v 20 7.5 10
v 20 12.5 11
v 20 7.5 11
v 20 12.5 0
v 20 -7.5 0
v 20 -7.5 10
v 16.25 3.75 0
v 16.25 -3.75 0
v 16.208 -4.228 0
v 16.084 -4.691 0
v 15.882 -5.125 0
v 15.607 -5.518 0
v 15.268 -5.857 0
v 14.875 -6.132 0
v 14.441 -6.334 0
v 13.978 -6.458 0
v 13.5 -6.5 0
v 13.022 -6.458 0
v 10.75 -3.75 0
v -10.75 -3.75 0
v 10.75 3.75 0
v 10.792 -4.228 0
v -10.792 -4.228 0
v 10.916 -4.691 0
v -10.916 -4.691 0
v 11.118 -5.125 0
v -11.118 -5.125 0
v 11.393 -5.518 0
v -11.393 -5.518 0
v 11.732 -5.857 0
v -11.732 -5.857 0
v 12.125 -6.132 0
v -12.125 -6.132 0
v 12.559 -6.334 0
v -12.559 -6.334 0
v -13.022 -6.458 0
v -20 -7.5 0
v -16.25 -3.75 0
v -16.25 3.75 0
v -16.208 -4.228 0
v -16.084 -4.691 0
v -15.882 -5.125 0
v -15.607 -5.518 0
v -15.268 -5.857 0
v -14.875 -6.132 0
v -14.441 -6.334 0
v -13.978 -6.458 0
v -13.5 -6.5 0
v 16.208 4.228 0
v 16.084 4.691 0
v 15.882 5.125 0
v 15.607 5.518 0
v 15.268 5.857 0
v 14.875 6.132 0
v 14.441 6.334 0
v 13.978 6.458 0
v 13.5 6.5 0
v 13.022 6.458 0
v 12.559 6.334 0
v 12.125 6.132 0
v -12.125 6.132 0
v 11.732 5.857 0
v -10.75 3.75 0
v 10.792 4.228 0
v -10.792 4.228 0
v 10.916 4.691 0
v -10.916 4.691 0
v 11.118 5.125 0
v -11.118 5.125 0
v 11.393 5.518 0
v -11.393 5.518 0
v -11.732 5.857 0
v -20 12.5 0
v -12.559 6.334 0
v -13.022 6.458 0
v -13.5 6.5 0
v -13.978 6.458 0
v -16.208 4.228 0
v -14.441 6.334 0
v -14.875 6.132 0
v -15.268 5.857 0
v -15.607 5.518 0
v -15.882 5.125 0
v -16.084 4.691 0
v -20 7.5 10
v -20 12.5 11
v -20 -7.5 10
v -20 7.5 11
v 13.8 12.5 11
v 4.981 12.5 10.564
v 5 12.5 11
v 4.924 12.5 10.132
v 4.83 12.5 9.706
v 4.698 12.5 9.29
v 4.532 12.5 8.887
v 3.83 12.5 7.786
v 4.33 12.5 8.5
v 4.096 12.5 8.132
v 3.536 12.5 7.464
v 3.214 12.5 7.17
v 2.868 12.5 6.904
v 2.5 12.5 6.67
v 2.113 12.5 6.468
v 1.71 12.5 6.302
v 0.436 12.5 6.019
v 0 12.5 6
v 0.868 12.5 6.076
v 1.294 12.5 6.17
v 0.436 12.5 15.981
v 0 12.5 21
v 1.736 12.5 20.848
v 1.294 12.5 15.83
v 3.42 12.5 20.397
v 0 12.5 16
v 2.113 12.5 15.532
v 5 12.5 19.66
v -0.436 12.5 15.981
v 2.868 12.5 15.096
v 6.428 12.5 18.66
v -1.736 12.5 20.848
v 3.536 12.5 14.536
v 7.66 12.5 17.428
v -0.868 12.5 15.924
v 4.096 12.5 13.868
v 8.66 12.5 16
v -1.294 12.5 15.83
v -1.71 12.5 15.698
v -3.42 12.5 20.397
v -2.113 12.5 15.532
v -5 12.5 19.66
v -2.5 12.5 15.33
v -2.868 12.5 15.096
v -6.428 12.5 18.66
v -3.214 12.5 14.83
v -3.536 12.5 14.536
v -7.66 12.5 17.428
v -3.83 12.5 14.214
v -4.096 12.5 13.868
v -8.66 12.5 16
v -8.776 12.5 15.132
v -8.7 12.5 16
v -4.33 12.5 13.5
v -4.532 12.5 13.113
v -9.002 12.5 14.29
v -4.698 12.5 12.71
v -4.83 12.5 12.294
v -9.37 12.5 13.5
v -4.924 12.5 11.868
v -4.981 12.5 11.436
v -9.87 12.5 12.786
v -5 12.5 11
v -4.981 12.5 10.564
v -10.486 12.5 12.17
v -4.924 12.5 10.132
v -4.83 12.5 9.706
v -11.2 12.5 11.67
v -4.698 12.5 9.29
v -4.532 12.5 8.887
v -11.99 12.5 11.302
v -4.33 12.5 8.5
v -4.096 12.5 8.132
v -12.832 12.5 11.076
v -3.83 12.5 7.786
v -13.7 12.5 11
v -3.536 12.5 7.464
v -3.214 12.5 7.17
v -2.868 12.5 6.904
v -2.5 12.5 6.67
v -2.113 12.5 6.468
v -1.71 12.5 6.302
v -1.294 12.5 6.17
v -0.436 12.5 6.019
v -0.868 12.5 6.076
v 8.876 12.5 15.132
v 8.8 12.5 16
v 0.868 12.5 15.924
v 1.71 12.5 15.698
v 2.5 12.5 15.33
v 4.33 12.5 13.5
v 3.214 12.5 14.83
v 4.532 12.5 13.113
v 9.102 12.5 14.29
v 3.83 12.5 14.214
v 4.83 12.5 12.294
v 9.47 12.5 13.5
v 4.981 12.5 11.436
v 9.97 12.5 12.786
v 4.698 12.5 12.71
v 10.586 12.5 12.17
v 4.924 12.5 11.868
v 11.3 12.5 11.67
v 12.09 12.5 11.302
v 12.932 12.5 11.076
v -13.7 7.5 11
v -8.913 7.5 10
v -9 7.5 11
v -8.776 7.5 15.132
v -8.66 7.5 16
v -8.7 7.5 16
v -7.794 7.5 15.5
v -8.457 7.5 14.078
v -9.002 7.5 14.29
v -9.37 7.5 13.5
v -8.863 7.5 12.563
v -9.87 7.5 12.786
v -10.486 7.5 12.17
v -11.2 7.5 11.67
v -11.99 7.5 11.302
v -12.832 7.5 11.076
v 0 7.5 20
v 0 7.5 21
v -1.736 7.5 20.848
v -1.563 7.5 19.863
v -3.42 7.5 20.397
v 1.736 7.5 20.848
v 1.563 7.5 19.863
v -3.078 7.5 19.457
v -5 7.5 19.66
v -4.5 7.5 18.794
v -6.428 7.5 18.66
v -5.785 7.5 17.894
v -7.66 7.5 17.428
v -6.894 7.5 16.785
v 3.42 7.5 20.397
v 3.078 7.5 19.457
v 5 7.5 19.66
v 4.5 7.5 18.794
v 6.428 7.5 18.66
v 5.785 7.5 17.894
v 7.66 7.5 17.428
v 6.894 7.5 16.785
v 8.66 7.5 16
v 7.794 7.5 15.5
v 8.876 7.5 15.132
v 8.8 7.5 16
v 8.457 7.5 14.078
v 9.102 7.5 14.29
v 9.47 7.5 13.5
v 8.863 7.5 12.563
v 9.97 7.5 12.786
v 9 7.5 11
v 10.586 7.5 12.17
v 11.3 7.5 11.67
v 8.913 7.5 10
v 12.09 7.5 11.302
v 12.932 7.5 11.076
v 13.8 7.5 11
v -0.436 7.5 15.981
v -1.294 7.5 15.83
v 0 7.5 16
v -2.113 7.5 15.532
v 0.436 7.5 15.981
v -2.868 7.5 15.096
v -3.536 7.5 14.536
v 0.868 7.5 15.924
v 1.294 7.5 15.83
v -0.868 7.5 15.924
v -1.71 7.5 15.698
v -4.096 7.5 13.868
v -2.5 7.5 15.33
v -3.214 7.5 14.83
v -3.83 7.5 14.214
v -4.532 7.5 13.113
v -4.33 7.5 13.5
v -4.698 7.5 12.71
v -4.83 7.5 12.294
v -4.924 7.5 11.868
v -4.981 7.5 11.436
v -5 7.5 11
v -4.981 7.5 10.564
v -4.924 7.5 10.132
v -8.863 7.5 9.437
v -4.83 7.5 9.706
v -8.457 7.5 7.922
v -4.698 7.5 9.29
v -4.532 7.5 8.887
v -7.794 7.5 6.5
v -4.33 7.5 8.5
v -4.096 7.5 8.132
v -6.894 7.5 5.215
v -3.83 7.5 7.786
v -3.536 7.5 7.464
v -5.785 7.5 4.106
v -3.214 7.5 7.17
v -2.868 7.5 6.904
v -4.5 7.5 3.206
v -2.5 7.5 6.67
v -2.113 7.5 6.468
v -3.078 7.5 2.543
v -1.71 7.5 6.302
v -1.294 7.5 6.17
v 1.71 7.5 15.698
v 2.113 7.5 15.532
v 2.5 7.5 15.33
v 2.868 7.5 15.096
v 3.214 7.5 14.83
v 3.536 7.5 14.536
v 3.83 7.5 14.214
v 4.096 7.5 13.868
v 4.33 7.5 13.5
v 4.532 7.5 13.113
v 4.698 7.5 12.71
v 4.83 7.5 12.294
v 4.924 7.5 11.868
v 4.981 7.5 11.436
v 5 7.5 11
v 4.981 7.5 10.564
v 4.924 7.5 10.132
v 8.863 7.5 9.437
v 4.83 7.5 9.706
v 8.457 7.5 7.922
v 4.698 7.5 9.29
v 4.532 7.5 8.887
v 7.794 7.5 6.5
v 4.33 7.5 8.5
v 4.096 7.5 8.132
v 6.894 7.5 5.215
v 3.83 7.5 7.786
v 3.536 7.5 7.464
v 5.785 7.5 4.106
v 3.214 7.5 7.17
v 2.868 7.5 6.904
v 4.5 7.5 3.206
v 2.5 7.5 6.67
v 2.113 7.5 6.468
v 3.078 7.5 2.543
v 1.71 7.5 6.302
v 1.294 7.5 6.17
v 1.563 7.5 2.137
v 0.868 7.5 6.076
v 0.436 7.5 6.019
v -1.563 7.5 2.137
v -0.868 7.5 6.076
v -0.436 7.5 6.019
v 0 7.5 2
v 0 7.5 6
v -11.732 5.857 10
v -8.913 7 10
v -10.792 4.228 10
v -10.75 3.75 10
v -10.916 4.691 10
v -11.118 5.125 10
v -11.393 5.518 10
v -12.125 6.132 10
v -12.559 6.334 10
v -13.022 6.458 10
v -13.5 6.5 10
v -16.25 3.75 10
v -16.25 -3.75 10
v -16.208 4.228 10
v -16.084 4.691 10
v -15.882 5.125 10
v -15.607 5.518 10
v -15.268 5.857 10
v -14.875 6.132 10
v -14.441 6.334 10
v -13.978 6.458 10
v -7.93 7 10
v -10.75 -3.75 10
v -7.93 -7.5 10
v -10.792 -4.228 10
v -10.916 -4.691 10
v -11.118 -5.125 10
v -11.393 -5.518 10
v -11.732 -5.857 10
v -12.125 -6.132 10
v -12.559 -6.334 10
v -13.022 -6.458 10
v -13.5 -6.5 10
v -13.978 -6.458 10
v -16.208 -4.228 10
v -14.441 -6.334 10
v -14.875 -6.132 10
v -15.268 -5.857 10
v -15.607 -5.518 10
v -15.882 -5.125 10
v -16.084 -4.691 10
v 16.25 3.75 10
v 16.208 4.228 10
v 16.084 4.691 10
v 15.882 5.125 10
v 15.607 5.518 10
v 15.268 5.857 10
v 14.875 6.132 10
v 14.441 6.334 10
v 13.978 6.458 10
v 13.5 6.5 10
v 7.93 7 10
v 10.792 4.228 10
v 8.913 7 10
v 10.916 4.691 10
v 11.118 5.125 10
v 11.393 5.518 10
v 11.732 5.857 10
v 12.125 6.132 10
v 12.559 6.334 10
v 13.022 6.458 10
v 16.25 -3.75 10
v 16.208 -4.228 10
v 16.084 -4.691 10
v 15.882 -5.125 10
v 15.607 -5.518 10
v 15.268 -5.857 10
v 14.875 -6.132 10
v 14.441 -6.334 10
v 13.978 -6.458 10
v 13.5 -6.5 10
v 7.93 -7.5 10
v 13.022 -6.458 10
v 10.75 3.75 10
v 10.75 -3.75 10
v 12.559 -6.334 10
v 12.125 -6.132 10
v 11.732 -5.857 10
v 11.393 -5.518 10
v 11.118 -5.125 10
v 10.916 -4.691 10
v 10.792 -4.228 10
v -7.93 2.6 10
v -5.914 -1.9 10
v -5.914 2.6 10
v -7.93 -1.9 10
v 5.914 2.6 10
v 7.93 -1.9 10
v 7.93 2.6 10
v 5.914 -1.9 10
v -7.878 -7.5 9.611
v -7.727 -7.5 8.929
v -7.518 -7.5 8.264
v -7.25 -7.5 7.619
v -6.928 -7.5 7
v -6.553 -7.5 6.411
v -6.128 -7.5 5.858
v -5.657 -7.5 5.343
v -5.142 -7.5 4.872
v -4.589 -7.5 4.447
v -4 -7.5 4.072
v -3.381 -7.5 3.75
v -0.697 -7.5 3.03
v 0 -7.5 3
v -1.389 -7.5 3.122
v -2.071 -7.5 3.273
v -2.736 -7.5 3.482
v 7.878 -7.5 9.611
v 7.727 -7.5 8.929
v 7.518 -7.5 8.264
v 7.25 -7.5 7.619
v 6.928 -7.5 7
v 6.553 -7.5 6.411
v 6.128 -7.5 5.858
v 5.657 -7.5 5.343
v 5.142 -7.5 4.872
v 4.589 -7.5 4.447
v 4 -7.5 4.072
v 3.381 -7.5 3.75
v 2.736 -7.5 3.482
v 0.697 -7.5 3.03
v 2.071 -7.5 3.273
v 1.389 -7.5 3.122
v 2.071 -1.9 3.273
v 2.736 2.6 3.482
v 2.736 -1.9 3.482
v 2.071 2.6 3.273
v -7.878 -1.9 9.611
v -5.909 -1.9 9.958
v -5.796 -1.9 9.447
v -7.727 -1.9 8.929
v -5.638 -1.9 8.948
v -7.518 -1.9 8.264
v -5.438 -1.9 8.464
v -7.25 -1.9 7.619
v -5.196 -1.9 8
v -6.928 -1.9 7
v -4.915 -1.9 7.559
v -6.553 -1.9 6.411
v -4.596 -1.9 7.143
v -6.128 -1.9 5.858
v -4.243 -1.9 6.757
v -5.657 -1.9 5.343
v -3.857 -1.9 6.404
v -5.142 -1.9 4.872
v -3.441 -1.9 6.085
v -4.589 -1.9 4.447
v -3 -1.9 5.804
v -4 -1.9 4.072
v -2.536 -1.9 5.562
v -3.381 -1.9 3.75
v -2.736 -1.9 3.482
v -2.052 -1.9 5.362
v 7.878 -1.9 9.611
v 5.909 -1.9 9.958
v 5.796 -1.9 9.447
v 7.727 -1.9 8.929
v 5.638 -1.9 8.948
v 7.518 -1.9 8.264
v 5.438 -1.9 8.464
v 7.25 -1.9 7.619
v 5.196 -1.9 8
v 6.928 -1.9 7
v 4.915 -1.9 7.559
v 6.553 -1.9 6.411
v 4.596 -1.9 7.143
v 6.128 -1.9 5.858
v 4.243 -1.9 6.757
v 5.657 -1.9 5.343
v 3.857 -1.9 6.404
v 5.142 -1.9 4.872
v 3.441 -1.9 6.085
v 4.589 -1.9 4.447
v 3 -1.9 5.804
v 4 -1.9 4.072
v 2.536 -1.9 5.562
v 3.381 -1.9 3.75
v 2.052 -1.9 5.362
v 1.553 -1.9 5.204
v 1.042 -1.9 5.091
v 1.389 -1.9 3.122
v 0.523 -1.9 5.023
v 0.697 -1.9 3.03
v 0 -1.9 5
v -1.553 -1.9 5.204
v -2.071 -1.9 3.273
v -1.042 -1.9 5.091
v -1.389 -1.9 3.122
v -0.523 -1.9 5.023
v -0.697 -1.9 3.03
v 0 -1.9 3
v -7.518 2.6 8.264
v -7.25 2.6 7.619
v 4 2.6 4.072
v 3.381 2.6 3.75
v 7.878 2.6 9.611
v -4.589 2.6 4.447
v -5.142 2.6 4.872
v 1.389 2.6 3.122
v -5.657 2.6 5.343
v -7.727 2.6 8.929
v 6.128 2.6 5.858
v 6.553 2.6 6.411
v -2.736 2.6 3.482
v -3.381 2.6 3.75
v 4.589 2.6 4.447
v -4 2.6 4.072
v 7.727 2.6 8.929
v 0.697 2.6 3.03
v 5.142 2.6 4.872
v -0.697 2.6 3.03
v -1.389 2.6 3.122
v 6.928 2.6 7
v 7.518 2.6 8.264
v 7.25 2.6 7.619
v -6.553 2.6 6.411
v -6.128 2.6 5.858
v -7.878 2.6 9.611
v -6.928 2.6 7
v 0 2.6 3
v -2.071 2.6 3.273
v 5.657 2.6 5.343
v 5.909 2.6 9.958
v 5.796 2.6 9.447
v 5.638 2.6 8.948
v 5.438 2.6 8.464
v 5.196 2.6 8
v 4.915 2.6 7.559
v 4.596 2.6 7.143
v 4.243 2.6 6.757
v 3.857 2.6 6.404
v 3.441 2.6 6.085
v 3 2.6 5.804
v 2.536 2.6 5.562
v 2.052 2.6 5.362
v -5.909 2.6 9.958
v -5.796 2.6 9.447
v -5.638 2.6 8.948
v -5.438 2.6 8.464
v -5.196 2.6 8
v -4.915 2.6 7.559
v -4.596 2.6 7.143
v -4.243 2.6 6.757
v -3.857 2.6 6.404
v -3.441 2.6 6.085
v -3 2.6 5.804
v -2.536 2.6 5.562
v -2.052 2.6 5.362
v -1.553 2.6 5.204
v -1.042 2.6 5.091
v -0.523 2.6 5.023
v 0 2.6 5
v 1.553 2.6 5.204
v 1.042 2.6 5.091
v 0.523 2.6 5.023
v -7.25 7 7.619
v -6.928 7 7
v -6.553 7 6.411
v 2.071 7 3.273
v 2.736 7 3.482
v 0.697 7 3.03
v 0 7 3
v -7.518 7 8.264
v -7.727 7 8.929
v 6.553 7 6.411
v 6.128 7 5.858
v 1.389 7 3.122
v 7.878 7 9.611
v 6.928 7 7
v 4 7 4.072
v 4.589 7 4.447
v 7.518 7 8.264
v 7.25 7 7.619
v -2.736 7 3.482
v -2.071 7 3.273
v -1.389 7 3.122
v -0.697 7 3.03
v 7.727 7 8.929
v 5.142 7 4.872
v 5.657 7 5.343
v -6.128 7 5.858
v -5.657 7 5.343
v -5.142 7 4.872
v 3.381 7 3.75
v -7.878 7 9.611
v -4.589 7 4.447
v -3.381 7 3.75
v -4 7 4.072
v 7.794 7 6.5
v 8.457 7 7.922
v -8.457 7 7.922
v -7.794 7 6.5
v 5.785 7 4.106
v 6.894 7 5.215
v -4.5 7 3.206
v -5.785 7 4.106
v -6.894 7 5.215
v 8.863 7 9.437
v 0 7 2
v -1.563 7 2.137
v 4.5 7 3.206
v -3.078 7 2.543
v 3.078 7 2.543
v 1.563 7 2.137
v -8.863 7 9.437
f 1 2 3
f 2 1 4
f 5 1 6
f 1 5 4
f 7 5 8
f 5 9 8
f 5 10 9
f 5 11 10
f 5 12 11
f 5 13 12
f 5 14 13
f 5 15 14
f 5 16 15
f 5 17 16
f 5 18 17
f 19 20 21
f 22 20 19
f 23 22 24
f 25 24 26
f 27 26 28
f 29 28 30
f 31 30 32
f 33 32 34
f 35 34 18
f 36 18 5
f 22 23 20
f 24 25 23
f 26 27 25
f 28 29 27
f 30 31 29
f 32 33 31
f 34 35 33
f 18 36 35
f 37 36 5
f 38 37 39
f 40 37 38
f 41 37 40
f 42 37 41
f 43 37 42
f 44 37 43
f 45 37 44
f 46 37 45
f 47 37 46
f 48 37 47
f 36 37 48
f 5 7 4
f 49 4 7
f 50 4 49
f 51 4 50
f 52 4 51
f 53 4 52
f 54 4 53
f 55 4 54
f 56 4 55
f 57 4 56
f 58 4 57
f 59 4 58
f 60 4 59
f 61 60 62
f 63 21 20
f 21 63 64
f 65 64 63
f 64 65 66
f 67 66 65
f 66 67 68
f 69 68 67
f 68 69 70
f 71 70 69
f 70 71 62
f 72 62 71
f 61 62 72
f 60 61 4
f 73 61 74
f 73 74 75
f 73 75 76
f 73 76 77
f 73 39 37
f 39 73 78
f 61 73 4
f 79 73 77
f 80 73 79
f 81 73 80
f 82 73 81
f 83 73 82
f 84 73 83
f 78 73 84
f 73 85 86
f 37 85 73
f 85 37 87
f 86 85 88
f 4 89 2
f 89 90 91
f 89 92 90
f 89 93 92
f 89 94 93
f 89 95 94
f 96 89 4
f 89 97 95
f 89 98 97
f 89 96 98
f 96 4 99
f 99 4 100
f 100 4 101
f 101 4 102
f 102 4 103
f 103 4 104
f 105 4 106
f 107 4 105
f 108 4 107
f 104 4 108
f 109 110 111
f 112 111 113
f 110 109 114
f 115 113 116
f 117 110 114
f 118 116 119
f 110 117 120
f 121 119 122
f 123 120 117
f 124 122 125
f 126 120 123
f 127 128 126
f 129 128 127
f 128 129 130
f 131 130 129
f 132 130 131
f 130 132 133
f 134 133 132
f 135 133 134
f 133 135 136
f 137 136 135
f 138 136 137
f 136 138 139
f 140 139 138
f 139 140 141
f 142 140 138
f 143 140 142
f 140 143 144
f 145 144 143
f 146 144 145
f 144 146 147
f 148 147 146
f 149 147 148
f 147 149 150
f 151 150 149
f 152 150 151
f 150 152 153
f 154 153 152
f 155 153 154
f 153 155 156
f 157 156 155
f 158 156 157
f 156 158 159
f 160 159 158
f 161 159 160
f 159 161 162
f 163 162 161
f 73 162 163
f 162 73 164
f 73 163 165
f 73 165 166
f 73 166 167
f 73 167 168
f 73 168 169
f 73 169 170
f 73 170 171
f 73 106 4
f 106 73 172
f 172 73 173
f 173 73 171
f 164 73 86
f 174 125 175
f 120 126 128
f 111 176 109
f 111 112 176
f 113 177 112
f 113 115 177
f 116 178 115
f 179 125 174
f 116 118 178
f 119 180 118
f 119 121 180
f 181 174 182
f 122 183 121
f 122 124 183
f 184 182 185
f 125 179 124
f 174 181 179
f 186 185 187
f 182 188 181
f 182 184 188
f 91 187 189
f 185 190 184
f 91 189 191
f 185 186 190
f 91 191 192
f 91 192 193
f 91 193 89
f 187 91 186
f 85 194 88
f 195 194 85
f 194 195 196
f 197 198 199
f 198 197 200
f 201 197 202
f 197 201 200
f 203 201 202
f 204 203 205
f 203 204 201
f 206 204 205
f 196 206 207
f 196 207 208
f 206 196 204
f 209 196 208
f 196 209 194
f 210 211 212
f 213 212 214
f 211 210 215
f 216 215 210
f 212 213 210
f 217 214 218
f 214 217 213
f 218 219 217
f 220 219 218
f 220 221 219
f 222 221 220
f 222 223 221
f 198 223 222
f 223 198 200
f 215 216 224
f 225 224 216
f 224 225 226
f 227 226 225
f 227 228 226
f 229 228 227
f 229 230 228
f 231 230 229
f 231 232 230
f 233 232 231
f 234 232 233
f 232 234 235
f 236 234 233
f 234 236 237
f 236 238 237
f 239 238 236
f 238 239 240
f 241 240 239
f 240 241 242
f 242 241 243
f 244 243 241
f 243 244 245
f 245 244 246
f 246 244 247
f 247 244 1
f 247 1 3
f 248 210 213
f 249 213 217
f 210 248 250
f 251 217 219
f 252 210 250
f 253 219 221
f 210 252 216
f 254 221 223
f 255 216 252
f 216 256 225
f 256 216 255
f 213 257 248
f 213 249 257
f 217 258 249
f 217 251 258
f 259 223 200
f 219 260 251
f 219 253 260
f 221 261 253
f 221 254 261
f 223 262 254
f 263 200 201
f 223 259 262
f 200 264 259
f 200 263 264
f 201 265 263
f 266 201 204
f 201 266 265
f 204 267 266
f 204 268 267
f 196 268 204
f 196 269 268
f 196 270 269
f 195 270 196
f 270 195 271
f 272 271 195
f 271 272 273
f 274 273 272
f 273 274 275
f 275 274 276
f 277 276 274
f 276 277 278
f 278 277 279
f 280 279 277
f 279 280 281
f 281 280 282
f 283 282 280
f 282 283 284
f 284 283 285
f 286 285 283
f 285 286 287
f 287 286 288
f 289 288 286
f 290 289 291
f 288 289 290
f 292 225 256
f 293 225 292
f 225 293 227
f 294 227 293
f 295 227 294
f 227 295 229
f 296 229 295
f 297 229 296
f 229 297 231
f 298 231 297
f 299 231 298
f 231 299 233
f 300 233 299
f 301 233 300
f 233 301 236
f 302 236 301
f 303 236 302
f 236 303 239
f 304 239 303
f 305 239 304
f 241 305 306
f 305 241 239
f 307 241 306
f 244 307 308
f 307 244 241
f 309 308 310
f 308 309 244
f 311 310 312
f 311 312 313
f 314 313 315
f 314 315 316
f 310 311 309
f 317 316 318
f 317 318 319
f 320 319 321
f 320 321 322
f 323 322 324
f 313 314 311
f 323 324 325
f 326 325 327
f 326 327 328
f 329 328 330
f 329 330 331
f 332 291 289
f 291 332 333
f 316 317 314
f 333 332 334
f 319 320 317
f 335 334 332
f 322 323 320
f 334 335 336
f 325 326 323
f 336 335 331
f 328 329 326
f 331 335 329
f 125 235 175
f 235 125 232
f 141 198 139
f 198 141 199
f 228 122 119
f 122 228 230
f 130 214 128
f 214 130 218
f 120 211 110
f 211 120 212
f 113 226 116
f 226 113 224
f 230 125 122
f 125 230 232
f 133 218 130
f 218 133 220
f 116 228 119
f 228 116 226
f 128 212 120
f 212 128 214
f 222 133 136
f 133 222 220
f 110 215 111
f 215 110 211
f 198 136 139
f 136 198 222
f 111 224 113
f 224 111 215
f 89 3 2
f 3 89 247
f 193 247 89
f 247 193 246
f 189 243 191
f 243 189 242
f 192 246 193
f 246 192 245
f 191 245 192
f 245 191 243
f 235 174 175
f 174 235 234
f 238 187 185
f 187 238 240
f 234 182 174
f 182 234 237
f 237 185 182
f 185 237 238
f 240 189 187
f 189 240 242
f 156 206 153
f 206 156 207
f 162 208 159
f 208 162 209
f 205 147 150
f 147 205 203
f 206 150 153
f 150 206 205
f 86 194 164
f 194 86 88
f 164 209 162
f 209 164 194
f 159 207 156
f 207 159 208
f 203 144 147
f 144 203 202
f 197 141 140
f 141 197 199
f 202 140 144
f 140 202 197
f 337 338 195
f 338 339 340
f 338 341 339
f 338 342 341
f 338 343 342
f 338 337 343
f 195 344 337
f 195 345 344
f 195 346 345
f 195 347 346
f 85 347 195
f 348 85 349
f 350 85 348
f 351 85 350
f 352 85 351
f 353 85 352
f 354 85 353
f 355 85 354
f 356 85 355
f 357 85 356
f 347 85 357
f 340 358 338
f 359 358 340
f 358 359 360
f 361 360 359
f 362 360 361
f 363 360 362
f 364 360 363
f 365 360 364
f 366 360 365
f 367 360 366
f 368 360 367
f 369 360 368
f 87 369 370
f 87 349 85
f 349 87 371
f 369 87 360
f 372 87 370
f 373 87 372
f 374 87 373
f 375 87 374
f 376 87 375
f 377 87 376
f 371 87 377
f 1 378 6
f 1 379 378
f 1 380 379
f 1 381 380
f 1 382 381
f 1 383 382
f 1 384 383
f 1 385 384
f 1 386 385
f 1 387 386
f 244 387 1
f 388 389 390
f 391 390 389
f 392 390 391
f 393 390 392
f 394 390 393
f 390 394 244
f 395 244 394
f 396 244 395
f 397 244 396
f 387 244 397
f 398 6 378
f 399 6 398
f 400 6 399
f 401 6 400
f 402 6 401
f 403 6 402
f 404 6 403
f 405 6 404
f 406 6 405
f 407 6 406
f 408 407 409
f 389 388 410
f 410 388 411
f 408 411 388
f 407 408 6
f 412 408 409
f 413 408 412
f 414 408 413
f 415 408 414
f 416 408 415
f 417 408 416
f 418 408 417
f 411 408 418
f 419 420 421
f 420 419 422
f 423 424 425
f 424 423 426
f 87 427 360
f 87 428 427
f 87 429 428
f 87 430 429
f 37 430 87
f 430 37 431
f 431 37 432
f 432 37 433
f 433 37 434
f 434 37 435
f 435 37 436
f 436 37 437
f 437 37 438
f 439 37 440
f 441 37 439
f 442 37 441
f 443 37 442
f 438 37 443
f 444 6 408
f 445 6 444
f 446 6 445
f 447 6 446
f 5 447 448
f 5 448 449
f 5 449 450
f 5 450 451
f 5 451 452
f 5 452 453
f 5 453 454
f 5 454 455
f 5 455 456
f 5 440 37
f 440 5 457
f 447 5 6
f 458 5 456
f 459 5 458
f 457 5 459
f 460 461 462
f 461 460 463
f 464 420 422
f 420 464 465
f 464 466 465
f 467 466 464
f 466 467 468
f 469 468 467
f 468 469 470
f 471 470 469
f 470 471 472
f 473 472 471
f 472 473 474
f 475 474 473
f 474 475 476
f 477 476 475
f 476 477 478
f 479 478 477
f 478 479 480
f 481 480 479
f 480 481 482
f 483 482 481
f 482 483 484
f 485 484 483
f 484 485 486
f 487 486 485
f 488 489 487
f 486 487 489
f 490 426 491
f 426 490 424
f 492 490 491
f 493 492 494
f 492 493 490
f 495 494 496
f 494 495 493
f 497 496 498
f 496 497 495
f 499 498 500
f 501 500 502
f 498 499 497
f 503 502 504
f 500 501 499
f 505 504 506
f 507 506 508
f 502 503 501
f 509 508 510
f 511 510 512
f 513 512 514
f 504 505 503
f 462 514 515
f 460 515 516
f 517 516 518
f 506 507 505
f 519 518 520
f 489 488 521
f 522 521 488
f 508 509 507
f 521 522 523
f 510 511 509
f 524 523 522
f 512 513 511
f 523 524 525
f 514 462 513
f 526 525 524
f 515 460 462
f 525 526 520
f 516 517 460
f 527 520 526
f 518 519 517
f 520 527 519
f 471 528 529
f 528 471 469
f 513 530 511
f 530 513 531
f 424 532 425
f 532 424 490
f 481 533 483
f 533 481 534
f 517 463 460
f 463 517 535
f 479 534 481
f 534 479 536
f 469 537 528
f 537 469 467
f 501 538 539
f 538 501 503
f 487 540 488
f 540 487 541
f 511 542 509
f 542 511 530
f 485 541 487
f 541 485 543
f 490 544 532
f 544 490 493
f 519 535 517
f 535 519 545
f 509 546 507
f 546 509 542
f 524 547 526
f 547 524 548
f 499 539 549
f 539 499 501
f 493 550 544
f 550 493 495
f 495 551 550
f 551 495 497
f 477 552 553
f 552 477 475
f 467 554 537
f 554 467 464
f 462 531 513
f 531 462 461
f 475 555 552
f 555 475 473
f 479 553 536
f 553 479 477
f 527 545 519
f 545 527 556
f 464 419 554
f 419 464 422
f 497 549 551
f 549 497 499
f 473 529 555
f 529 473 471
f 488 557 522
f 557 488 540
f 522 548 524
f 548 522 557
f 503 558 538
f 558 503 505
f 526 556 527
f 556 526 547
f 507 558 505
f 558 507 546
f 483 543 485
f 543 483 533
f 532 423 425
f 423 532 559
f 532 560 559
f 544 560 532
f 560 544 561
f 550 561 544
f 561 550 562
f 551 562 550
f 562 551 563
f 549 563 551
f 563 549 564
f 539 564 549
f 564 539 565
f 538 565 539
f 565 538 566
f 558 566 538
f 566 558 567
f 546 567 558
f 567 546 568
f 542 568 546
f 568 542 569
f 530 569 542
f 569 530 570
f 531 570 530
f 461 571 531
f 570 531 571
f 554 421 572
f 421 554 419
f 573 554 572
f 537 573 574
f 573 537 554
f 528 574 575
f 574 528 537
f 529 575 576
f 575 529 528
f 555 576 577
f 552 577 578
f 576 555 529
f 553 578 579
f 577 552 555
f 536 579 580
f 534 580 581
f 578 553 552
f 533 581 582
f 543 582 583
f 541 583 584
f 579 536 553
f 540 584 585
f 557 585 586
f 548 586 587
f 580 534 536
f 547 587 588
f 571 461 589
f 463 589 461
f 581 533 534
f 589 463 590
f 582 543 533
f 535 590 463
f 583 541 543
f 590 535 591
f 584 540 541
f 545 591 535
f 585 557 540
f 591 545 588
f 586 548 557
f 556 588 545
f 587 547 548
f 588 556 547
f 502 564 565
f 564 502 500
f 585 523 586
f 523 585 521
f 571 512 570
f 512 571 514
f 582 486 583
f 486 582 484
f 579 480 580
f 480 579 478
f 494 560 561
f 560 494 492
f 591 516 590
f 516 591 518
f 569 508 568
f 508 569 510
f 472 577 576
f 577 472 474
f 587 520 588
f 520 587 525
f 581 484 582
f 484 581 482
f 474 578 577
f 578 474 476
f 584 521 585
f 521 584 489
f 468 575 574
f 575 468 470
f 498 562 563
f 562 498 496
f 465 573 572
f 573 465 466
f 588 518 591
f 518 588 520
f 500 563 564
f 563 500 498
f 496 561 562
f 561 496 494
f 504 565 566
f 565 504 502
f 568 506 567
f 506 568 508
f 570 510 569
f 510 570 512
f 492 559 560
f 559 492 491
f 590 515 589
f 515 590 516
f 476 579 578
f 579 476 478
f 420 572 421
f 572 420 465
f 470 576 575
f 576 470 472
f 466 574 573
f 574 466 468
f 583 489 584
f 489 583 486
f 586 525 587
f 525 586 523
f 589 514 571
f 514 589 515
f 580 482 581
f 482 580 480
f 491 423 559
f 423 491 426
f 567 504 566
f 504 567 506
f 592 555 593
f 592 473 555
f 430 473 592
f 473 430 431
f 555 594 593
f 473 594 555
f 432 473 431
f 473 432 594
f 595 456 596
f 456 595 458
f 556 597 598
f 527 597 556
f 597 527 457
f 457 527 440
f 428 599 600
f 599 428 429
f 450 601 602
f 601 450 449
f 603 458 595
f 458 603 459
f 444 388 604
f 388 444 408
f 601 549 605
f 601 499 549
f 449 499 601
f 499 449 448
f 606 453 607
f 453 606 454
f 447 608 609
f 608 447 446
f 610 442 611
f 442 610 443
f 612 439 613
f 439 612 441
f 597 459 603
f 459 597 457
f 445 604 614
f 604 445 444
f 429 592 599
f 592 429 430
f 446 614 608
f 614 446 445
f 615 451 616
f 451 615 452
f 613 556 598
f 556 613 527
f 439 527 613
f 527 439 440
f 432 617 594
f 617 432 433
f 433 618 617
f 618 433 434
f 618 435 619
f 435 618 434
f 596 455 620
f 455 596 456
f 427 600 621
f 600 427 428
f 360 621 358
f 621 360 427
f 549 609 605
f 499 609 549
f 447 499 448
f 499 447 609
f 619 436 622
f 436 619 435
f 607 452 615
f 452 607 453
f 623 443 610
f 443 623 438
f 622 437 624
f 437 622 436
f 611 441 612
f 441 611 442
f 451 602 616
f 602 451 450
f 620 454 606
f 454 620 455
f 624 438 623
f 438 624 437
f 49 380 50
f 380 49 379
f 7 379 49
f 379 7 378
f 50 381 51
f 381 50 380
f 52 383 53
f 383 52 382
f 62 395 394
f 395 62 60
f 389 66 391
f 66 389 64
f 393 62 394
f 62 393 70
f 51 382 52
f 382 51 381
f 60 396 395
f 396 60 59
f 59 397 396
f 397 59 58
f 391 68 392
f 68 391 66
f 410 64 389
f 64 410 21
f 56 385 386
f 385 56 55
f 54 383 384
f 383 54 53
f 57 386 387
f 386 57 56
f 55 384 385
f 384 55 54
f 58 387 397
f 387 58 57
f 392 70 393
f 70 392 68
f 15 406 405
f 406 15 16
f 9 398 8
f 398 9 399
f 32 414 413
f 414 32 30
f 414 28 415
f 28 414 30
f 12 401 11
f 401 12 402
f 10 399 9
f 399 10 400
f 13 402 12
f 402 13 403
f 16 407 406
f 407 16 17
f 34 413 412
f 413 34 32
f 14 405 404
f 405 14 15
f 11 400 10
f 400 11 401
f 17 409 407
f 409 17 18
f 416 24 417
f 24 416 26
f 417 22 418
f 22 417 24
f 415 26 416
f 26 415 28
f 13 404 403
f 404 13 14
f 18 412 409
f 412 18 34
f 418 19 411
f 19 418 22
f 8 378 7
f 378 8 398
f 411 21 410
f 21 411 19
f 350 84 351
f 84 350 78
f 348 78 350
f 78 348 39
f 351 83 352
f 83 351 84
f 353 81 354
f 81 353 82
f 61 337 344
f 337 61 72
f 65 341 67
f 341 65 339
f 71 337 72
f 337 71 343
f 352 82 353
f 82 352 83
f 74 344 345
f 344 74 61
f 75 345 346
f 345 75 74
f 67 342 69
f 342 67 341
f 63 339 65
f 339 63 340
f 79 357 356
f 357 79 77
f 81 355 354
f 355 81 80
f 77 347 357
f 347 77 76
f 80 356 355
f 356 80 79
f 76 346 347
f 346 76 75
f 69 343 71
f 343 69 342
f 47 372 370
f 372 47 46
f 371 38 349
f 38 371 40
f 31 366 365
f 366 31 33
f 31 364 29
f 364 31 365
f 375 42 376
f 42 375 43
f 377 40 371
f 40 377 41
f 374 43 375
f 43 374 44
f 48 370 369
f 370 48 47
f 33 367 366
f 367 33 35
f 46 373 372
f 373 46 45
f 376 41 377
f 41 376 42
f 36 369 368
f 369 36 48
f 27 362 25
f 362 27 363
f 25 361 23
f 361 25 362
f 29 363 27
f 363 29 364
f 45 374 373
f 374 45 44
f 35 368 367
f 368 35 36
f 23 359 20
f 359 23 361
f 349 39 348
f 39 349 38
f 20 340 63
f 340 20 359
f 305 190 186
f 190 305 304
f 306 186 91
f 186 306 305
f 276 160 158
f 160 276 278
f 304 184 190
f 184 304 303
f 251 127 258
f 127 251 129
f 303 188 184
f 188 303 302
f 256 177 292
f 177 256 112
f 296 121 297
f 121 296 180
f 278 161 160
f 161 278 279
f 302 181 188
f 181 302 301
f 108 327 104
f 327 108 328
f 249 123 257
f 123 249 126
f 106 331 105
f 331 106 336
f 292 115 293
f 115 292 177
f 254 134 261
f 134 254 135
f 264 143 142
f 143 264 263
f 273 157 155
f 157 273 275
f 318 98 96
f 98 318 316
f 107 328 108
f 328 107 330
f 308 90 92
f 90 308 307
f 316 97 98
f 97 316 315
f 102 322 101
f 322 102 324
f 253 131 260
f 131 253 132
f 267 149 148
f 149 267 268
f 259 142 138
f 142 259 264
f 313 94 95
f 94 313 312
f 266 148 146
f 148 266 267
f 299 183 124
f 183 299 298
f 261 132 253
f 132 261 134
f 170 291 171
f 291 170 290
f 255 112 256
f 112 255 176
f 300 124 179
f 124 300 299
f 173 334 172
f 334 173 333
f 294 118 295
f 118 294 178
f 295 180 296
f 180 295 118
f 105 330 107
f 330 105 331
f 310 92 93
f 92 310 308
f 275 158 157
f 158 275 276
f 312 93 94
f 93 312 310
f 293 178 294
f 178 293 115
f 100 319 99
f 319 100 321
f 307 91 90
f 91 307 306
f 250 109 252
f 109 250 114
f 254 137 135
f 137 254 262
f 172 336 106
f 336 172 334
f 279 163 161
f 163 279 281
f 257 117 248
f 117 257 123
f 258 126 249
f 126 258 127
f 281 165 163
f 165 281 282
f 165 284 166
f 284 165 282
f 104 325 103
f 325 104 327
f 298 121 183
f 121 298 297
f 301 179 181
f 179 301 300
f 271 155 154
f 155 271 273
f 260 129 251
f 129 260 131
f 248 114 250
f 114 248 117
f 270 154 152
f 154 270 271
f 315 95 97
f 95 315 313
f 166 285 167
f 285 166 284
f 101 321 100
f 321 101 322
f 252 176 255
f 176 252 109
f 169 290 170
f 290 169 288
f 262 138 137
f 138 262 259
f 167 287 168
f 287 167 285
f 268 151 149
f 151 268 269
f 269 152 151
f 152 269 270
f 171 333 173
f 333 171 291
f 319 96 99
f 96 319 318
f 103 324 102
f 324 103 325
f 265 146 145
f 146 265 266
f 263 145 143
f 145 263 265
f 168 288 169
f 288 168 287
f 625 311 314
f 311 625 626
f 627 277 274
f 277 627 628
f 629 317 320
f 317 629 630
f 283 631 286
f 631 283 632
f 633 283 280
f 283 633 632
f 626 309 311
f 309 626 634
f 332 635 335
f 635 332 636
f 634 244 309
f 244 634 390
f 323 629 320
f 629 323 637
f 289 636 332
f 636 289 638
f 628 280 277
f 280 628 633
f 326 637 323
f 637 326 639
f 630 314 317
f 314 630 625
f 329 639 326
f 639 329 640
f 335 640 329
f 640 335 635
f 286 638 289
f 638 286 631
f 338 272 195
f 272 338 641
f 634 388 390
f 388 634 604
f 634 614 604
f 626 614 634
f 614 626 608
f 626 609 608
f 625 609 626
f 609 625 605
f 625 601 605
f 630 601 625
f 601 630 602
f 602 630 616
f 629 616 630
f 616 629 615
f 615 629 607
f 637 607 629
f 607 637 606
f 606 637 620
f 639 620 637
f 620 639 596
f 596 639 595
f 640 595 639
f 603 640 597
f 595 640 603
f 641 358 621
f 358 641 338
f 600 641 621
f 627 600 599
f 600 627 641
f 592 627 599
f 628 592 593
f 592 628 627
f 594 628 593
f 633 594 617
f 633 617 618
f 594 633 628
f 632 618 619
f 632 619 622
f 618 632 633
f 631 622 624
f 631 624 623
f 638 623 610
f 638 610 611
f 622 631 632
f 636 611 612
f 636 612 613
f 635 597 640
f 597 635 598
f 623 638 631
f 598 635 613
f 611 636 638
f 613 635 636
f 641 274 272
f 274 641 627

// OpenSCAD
// file: configuration.scad
$fn = 18;

wall = 5;

bolt_slop = .5;
nut_slop = .85;
bolt_dia = 5+bolt_slop;
bolt_rad = bolt_dia/2;
bolt_cap_dia = 8.5+bolt_slop;
bolt_cap_rad = bolt_cap_dia/2;
nut_dia = 9+nut_slop;
nut_rad = nut_dia/2;
nut_height = 3;
// main file
include <configuration.scad>;

rail_width=25.4649;
v_rad = 9.77;
arm_sep = 70;

hotend_rad = 8;
hotend_groove_rad=6;

rod_end_thickness = 8;

//translate([0,0,65]) cube([40,40,10],center=true);
//translate([0,36,20]) cube([40,10,40],center=true);

$fn=36;
height = 40;
radius = 40;
extruder_rad = 25;
center_rad = 15;
igus_rad = 6/2;
shroud_height = 40;	//height of fan shroud.  Adjust based on extruder.

//%translate([0,0,0]) cylinder(r=extruder_rad, h=1);
%rotate([0,0,30]) cylinder(r=center_rad/cos(60), h=1, $fn=3);


//rail_effector();
//adjustable_wheel();
//hotend_effector();
//translate([0,33,25])
hotend_clamp();
//rod_end();

module hotend_effector(){
	difference(){
		union(){
			//body
			//hexamid();

			//arms
			for(i=[0:120:359]) rotate([0,0,i])
				translate([0,radius,height]) arm_mounts_outer(1);

			//arm supports
			for(i=[0:120:359]) rotate([0,0,i])
				//translate([0,-radius,0]) rotate([30,0,0]) ybar(6.9, height+9);
				translate([0,-radius,0]) rotate([30,0,0]) translate([0,0,-.5]) ybar(13, height+6);


			//extruder mounts
			for(i=[0:120:359]) rotate([0,0,i])
				translate([0,extruder_rad,0]) extruder_mount(1);

			//fan diverter
			fan_shroud();

			//anchor
			#for(i=[0:120:359]) rotate([0,0,i])
				translate([-wall/4,0,0]) cube([wall/2,extruder_rad/2,wall/2]);
		}

		//arms
		for(i=[0:120:359]) rotate([0,0,i])
			translate([0,radius,height]) arm_mounts_outer(0);

		//extruder mounts
		for(i=[0:120:359]) rotate([0,0,i])
			translate([0,extruder_rad,0]) extruder_mount(0);

		//clean up the bottom
		translate([0,0,-50]) cube([100,100,100],center=true);
	}
}

body_rad = 60;

module hexamid(){
	difference(){
		union(){
			rotate([0,0,30]) cylinder(r1=body_rad/cos(180/6), r2=center_rad/cos(180/6), h=height-wall, $fn=6);
		}

		for(i=[90:120:359]){
			rotate([0,0,i]) translate([body_rad/cos(180/6)+wall*1.5,0,-.1]) rotate([0,0,180/12]) cylinder(r=body_rad/cos(180/12), h=height+2, $fn=12);
		}

		//translate([0,0,-wall]) rotate([0,0,-30]) cylinder(r1=body_rad/cos(180/3), r2=0, height, $fn=3);
		#translate([0,0,0]) sphere(r=36, $fn=36);

		rotate([0,0,30]) cylinder(r=center_rad/2+wall, h=100, $fn=3);
	}
}

mount_height = 15;
mount_width = 75;

module extruder_mount(solid = 1){
	if(solid){
		translate([-mount_width/2,-wall*2,0]) cube([mount_width,wall*2,mount_height]);
		cylinder(r=hotend_rad+wall, h=mount_height, $fn=18);
	}else{
		union(){
			//shore up the front
			translate([-mount_width/4,.01,-.1]) cube([mount_width/2,wall*3,mount_height+1]);

			//hotend hole
			translate([0,0,-.1]) cylinder(r=hotend_rad/cos(180/18), h=mount_height+1, $fn=36);
			%translate([0,0,0]) cylinder(r=2, h=50);

			//bolt slots
			render() for(i=[0,1]) mirror([i,0,0]){
				translate([hotend_rad+bolt_dia,0,mount_height/2]) rotate([-90,0,0]) cylinder(r=bolt_rad, h=wall*3, center=true);
				translate([hotend_rad+bolt_dia,-wall*2-.1,mount_height/2]) rotate([-90,0,0]) cylinder(r=nut_rad, h=nut_height+.2, $fn=6);

				//translate([hotend_rad+bolt_dia,0,mount_height]) rotate([-90,0,0]) cylinder(r=bolt_rad, h=wall*2, center=true);
				//translate([hotend_rad+bolt_rad,-wall*2/2,mount_height/2]) cube([bolt_dia,wall*2+.02,mount_height/2]);

				//translate([hotend_rad+bolt_dia,0,mount_height]) cube([nut_dia,nut_height+.2,mount_height+nut_dia], center=true);
			}
		}
	}
}

module ybar(size = wall*2, height = height){
	difference(){
		rotate([0,0,30]) cylinder(r=size, h=height, $fn=6);
		for(i=[60:120:359]) rotate([0,0,i]) translate([0,size+wall,-.1]) rotate([0,0,30]) cylinder(r=size, h=height+.2, $fn=6);
		for(i=[0:120:359]) rotate([0,0,i]) translate([0,size+wall,height/3]) scale([1,1,2.25]) sphere(r=size);
	}
//	rotate([0,0,-30]) difference(){
//		cylinder(r=size/cos(60), h = height, $fn=3);
//		for(i=[-30:120:359]) rotate([0,0,i]) translate([0,size,-.1]) rotate([0,0,30]) cylinder(r=size/2, h=height+.2,$fn=36);
//	}
}

module fan_shroud(){
	difference(){
		union(){
			for(i=[0:120:359]){
				rotate([0,0,i]) translate([0,center_rad+1,0]) scale([1.3,1,shroud_height/center_rad]) sphere(r=center_rad+1);
			}
		}
		
		for(i=[0:120:359]) rotate([0,0,i]) translate([0,center_rad+1,-.1]) {
			scale([1.3,1,shroud_height/center_rad]) sphere(r=center_rad);
			translate([-30,0,0]) cube([60,30,60]);
		}

		//cut off the bottom
		translate([0,0,-50]) cube([100,100,100], center=true);
	}
}

bracket_height = 15;
bracket_thick = wall*2;
bracket_width = 40;

pushfit_dia = 10;
pushfit_rad = pushfit_dia/2;
pushfit_thread_dia = 6;
pushfit_thread_rad = pushfit_thread_dia/2;

groove_height = 4.5; //dec
groove_rad = 6;
groove_top = 4.9; //dec

//holds the extruder on
module hotend_clamp(){

	difference(){
		union(){
			//hotend block
			translate([0,0,bracket_thick/2]) cube([bracket_width, bracket_height, bracket_thick], center=true);
			//pushfit connector   //dec
			difference () {
				translate([0,bracket_height/2,0]) {
					translate([0,pushfit_rad/2,(bracket_thick+pushfit_rad+wall)/2+.5]) cube([bracket_width, pushfit_rad, bracket_thick+pushfit_rad+1+wall], center=true);
					translate([0,pushfit_rad/2,bracket_thick+1]) rotate([90,0,0]) cylinder(r=pushfit_rad+wall*2/2, h=pushfit_rad, center=true);
				}
				rotate ([90,0,0]) translate ([0,16,-15]) obloid_thingy();
			}
		}

		//pushfit hole
		translate([0,bracket_height/2,bracket_thick+1]) rotate([90,0,0]) cylinder(r=pushfit_rad, h=15, center=true, $fn=72);

		//hotend hole
		difference(){
			translate([0,0,bracket_thick+1]) rotate([90,0,0]) cylinder(r=hotend_rad, h=bracket_height, center=true, $fn=72);
			//groove slot
			translate([0,bracket_height/2-groove_top-groove_height/2,bracket_thick+1]) rotate([90,0,0]) difference() {
				cylinder(r=hotend_rad, h=groove_height, center=true, $fn=72);
				cylinder(r=groove_rad, h=groove_height+.2, center=true, $fn=72);
			}
		}
		translate([0,bracket_height/2,bracket_thick+1]) rotate([90,0,0]) cylinder(r=hotend_rad+1, h=.5);
		

		//bolt slots
		render() for(i=[0,1]) mirror([i,0,0]){
			translate([hotend_rad+bolt_dia,bracket_height/4,bracket_thick/2]) cylinder(r=bolt_rad, h=bracket_thick+1, center=true);
			translate([hotend_rad+bolt_dia,-bracket_height/4,bracket_thick/2]) cylinder(r=bolt_rad, h=bracket_thick+1, center=true);
			translate([hotend_rad+bolt_rad,-bracket_height/4,-.5]) cube([bolt_dia,bracket_height/2,bracket_thick+1]); 
		}
	}
}
module obloid_thingy (){ //dec
	union() {
		difference () {
			translate ([-pushfit_rad*6,0,0]) cube ([pushfit_rad*12,pushfit_rad*4,10]);	
			translate ([0,-pushfit_rad,0]) cylinder (r=pushfit_rad+wall*2/2, h=10);			
			//translate ([pushfit_rad*2,0,0]) cylinder (r1=pushfit_rad,r2=pushfit_rad,h=10);		
			//translate ([-pushfit_rad*3,0,0]) cylinder (r1=pushfit_rad,r2=pushfit_rad,h=10);	
		}
		union () {

			hull () {
				translate ([3*pushfit_rad-1.2,0,0]) cylinder (r1=pushfit_rad,r2=pushfit_rad,h=10);
				translate ([6*pushfit_rad,0,0]) cylinder (r1=pushfit_rad,r2=pushfit_rad,h=10);
			}	
			hull () {
				translate ([-3*pushfit_rad+1.3,0,0]) cylinder (r1=pushfit_rad,r2=pushfit_rad,h=10);
				translate ([-6*pushfit_rad,0,0]) cylinder (r1=pushfit_rad,r2=pushfit_rad,h=10);
			}
		}
	}
}

bio_rad = 96;
module biohazard(){
	difference(){
		for(i=[0:120:359]) rotate([0,0,i]){
			intersection(){
				translate([0,bio_rad,0]) cylinder(r=bio_rad, h=wall*2, $fn=64);
				cylinder(r=62, h=wall*2, $fn=64);
			}
		}
		for(i=[0:120:359]) rotate([0,0,i]){
			translate([0,bio_rad+wall*3,-.1]) cylinder(r=bio_rad-wall, h=wall*2+.2, $fn=64);
		}
	}
}

module rail_effector(){
	difference(){
		union(){
			//v wheels
			%translate([-rail_width/2-v_rad,0,0]) adjustable_wheel();
			adjustable_wheel_mount(1);

			for(i=[0,1]) mirror([0,i,0]) translate([rail_width/2+v_rad,(rail_width+v_rad*2)/sqrt(3),0]) wheel_mount(1);

			//arms
			translate([0,radius-.5,0]) arm_mounts(1);

			//belt mount
			for(i=[0,1]) mirror([0,i,0]) translate([8,(rail_width/2+v_rad+8)/sqrt(3),0]) belt_mount(1);

			//connect everything up
			rail_body();
		}

		//holes for everything
		//v wheels
		//translate([-rail_width/2-v_rad,0,0]) wheel_mount(0);
		adjustable_wheel_mount(0);
		for(i=[0,1]) mirror([0,i,0]) translate([rail_width/2+v_rad,(rail_width+v_rad*2)/sqrt(3),0]) wheel_mount(0);

		//arms
		translate([0,radius-.5,0]) arm_mounts(0);

		//belt mount
		for(i=[0,1]) mirror([0,i,0]) translate([8,(rail_width/2+v_rad+8)/sqrt(3),0]) belt_mount(0);
	}
}

slider_offset=6.5;

module adjustable_wheel(){
	difference(){
		union(){
			wheel_mount(1);
			intersection(){
				translate([0,0,wall]) rotate([0,90,0]) cylinder(r=v_rad/cos(45)-.5, h=16, center=true, $fn=4);
				translate([0,0,wall]) cube([20,30,wall*2],center=true);
				translate([9,0,0]) cylinder(r=18, h=30, $fn=6);
			}
		}
		wheel_mount(0);
		for(i=[0,1]) mirror([0,i,0]) {
			translate([-9,slider_offset,wall]) rotate([0,90,0]) cylinder(r=bolt_rad, h=20);
			translate([-13,slider_offset,wall]) rotate([0,90,0]) cylinder(r=bolt_cap_rad+.5, h=8);
		}
	}
}

gap = 2;
module adjustable_wheel_mount(solid = 1){
	if(solid){
		//beef up the slot
		intersection(){
			translate([-radius/2-rail_width/2+gap+wall*2,0,wall]) rotate([0,90,0]) cylinder(r=v_rad/cos(45)+wall/cos(45), h=radius, center=true, $fn=4);
			translate([-radius/2-rail_width/2+gap+wall*2,0,wall]) cube([radius, radius, wall*2],center=true);
			cylinder(r=radius-rounding/cos(30), h=wall*2, $fn=6);
		}
		translate([-rail_width/2+gap-.02+wall+nut_height/2,0,wall+1-.1]) cube([nut_height,30,2],center=true);
	}else{
		//slot
		translate([-radius/2-rail_width/2+gap,0,wall]) rotate([0,90,0]) cylinder(r=v_rad/cos(45), h=radius, center=true, $fn=4);

		//bolt holes
		for(i=[0,1]) mirror([0,i,0]) {
			translate([-rail_width/2+gap/2-.01,slider_offset,wall]) rotate([0,90,0]) cylinder(r=bolt_rad, h=wall*2);
			translate([-rail_width/2+gap/2-.02+wall+nut_height,slider_offset,wall]) rotate([0,90,0]) cylinder(r=nut_rad, h=wall-1, $fn=6);
			translate([-rail_width/2+gap/2-.02+wall+nut_height,slider_offset,wall+nut_rad]) rotate([0,90,0]) cylinder(r=nut_rad, h=wall, $fn=6);
		}
	}
}

rounding = wall/2;

module rail_body(){
	//backbone
	minkowski(){
		union(){
			difference(){
				cylinder(r=radius-rounding/cos(30), h=wall-rounding, $fn=6);
				cylinder(r=radius-rounding/cos(30)-wall/cos(30), h=wall-rounding+.1, $fn=6);
			}
			translate([0,0,wall-rounding]) difference(){
				cylinder(r=radius-(rounding+2.45)/cos(30), h=wall-rounding, $fn=6);
				cylinder(r=radius-(rounding+2.55)/cos(30), h=wall-rounding+.1, $fn=6);
			}
		}
		intersection(){
			sphere(r=rounding, $fn=12);
			translate([0,0,wall]) cube([wall*2, wall*2, wall*2], center=true);
		}
	}
}

module belt_mount(solid = 1){
	if(solid){
		cylinder(r=v_rad, h=wall);
		translate([0,0,wall]) cylinder(r1=v_rad, r2=bolt_cap_rad, h=nut_height+1);
	}else{
		translate([0,0,-.01]) cylinder(r=nut_rad, h=nut_height, $fn=6);
		translate([0,0,nut_height+.3]) cylinder(r=bolt_rad, h=wall+1);
	}
}

module wheel_mount(solid = 1){
	if(solid){
		cylinder(r=v_rad-2, h=wall);
		translate([0,0,wall]) cylinder(r1=v_rad-2, r2=8/2, h=10);
	}else{
		translate([0,0,-.01]) cylinder(r=nut_rad, h=nut_height*2, $fn=6);
		translate([0,0,nut_height*2+.3]) cylinder(r=bolt_rad, h=20);
	}
}

arm_rad = wall*1.75;
//45 degrees: (arm_rad-igus_rad)
//60 degrees: (arm_rad-igus_rad)/sqrt(3);
cone_height = (arm_rad-igus_rad);
echo(cone_height);

module arm_mounts(solid = 1){
	translate([0,0,wall]) rotate([0,90,0])
	if(solid){
		cylinder(r=arm_rad, h=arm_sep-cone_height*2, center=true, $fn=12);
		for(i=[0,1]) mirror([0,0,i]) translate([0,0,arm_sep/2-cone_height]) cylinder(r1=arm_rad, r2=igus_rad, h=cone_height, $fn=12);
	}else{
		//nut slot
		translate([0,0,-.01]) cylinder(r=nut_rad, h=arm_sep-cone_height*2, center=true, $fn=6);
		translate([nut_rad,0,-.01]) cylinder(r=nut_rad, h=arm_sep-cone_height*2, center=true, $fn=6);
		cylinder(r=bolt_rad, h=arm_sep+wall, center=true);

		//flatten the bottom
		translate([wall+10,0,0]) cube([20,25,arm_sep],center=true);

		//make sure the rod can't hit anything
		#render() for(i=[0,1]) mirror([0,0,i]) translate([0,0,arm_sep/2+rod_end_thickness/2]) rod_end_sweep();
	}
}

module rod_end_sweep(){
	#difference(){
		sphere(r=9.5, $fn=36);
		for(i=[0,1]) mirror([0,0,i]) translate([0,0,rod_end_thickness/2-.1]) cylinder(r1=igus_rad, r2=36, h=((36-igus_rad)/2)/sqrt(3),$fn=12);
	}
}

module arm_mounts_outer(solid = 1){
	translate([0,0,0]) rotate([0,90,0])
	if(solid){
		for(i=[0,1]) mirror([0,0,i]) translate([0,0,arm_sep/2+rod_end_thickness]){
			cylinder(r2=arm_rad, r1=igus_rad, h=cone_height, $fn=18);
			translate([0,0,cone_height]) cylinder(r=arm_rad, h=cone_height, $fn=18);
			translate([0,0,cone_height*2]) sphere(r=arm_rad, $fn=18);
		}
	}else{
		for(i=[0,1]) mirror([0,0,i]) translate([0,0,arm_sep/2+rod_end_thickness]){
			render() translate([0,0,-rod_end_thickness/2]) rod_end_sweep();
			translate([0,0,-.1]) cylinder(r=bolt_rad, h=wall*3);
			translate([0,0,wall+arm_rad]) cylinder(r=nut_rad, h=wall*3, $fn=6);
		}

		//flatten the bottom
		//translate([wall+10,0,0]) cube([20,25,arm_sep*2],center=true);
	}
}

rod_size = 8.4;
taper = 4;
module rod_end(){
	translate([0,0,rod_size*cos(30)-1]) rotate([90+taper,0,0])
	difference(){
		cylinder(r=rod_size, h=40, $fn=6);

		//taper
		for(i=[0:1]) mirror([0,i,0]) translate([-10,rod_size*cos(30)-1,0]) rotate([taper,0,0]) translate([0,0,-1]) cube([20,10,50]);

		//carbon fiber hole
		translate([0,0,-.01]) rotate([0,0,45]) cylinder(r=rod_size/2/cos(180/4), h=20, $fn=4);

		//nut hole
		translate([0,0,22.5]){
			cylinder(r=bolt_rad, h=20);
			cylinder(r1=nut_rad+1, r2=nut_rad, h=15, $fn=6);
			translate([0,0,7.5]) cube([nut_rad+1,20,15],center=true);
		}
	}
}
